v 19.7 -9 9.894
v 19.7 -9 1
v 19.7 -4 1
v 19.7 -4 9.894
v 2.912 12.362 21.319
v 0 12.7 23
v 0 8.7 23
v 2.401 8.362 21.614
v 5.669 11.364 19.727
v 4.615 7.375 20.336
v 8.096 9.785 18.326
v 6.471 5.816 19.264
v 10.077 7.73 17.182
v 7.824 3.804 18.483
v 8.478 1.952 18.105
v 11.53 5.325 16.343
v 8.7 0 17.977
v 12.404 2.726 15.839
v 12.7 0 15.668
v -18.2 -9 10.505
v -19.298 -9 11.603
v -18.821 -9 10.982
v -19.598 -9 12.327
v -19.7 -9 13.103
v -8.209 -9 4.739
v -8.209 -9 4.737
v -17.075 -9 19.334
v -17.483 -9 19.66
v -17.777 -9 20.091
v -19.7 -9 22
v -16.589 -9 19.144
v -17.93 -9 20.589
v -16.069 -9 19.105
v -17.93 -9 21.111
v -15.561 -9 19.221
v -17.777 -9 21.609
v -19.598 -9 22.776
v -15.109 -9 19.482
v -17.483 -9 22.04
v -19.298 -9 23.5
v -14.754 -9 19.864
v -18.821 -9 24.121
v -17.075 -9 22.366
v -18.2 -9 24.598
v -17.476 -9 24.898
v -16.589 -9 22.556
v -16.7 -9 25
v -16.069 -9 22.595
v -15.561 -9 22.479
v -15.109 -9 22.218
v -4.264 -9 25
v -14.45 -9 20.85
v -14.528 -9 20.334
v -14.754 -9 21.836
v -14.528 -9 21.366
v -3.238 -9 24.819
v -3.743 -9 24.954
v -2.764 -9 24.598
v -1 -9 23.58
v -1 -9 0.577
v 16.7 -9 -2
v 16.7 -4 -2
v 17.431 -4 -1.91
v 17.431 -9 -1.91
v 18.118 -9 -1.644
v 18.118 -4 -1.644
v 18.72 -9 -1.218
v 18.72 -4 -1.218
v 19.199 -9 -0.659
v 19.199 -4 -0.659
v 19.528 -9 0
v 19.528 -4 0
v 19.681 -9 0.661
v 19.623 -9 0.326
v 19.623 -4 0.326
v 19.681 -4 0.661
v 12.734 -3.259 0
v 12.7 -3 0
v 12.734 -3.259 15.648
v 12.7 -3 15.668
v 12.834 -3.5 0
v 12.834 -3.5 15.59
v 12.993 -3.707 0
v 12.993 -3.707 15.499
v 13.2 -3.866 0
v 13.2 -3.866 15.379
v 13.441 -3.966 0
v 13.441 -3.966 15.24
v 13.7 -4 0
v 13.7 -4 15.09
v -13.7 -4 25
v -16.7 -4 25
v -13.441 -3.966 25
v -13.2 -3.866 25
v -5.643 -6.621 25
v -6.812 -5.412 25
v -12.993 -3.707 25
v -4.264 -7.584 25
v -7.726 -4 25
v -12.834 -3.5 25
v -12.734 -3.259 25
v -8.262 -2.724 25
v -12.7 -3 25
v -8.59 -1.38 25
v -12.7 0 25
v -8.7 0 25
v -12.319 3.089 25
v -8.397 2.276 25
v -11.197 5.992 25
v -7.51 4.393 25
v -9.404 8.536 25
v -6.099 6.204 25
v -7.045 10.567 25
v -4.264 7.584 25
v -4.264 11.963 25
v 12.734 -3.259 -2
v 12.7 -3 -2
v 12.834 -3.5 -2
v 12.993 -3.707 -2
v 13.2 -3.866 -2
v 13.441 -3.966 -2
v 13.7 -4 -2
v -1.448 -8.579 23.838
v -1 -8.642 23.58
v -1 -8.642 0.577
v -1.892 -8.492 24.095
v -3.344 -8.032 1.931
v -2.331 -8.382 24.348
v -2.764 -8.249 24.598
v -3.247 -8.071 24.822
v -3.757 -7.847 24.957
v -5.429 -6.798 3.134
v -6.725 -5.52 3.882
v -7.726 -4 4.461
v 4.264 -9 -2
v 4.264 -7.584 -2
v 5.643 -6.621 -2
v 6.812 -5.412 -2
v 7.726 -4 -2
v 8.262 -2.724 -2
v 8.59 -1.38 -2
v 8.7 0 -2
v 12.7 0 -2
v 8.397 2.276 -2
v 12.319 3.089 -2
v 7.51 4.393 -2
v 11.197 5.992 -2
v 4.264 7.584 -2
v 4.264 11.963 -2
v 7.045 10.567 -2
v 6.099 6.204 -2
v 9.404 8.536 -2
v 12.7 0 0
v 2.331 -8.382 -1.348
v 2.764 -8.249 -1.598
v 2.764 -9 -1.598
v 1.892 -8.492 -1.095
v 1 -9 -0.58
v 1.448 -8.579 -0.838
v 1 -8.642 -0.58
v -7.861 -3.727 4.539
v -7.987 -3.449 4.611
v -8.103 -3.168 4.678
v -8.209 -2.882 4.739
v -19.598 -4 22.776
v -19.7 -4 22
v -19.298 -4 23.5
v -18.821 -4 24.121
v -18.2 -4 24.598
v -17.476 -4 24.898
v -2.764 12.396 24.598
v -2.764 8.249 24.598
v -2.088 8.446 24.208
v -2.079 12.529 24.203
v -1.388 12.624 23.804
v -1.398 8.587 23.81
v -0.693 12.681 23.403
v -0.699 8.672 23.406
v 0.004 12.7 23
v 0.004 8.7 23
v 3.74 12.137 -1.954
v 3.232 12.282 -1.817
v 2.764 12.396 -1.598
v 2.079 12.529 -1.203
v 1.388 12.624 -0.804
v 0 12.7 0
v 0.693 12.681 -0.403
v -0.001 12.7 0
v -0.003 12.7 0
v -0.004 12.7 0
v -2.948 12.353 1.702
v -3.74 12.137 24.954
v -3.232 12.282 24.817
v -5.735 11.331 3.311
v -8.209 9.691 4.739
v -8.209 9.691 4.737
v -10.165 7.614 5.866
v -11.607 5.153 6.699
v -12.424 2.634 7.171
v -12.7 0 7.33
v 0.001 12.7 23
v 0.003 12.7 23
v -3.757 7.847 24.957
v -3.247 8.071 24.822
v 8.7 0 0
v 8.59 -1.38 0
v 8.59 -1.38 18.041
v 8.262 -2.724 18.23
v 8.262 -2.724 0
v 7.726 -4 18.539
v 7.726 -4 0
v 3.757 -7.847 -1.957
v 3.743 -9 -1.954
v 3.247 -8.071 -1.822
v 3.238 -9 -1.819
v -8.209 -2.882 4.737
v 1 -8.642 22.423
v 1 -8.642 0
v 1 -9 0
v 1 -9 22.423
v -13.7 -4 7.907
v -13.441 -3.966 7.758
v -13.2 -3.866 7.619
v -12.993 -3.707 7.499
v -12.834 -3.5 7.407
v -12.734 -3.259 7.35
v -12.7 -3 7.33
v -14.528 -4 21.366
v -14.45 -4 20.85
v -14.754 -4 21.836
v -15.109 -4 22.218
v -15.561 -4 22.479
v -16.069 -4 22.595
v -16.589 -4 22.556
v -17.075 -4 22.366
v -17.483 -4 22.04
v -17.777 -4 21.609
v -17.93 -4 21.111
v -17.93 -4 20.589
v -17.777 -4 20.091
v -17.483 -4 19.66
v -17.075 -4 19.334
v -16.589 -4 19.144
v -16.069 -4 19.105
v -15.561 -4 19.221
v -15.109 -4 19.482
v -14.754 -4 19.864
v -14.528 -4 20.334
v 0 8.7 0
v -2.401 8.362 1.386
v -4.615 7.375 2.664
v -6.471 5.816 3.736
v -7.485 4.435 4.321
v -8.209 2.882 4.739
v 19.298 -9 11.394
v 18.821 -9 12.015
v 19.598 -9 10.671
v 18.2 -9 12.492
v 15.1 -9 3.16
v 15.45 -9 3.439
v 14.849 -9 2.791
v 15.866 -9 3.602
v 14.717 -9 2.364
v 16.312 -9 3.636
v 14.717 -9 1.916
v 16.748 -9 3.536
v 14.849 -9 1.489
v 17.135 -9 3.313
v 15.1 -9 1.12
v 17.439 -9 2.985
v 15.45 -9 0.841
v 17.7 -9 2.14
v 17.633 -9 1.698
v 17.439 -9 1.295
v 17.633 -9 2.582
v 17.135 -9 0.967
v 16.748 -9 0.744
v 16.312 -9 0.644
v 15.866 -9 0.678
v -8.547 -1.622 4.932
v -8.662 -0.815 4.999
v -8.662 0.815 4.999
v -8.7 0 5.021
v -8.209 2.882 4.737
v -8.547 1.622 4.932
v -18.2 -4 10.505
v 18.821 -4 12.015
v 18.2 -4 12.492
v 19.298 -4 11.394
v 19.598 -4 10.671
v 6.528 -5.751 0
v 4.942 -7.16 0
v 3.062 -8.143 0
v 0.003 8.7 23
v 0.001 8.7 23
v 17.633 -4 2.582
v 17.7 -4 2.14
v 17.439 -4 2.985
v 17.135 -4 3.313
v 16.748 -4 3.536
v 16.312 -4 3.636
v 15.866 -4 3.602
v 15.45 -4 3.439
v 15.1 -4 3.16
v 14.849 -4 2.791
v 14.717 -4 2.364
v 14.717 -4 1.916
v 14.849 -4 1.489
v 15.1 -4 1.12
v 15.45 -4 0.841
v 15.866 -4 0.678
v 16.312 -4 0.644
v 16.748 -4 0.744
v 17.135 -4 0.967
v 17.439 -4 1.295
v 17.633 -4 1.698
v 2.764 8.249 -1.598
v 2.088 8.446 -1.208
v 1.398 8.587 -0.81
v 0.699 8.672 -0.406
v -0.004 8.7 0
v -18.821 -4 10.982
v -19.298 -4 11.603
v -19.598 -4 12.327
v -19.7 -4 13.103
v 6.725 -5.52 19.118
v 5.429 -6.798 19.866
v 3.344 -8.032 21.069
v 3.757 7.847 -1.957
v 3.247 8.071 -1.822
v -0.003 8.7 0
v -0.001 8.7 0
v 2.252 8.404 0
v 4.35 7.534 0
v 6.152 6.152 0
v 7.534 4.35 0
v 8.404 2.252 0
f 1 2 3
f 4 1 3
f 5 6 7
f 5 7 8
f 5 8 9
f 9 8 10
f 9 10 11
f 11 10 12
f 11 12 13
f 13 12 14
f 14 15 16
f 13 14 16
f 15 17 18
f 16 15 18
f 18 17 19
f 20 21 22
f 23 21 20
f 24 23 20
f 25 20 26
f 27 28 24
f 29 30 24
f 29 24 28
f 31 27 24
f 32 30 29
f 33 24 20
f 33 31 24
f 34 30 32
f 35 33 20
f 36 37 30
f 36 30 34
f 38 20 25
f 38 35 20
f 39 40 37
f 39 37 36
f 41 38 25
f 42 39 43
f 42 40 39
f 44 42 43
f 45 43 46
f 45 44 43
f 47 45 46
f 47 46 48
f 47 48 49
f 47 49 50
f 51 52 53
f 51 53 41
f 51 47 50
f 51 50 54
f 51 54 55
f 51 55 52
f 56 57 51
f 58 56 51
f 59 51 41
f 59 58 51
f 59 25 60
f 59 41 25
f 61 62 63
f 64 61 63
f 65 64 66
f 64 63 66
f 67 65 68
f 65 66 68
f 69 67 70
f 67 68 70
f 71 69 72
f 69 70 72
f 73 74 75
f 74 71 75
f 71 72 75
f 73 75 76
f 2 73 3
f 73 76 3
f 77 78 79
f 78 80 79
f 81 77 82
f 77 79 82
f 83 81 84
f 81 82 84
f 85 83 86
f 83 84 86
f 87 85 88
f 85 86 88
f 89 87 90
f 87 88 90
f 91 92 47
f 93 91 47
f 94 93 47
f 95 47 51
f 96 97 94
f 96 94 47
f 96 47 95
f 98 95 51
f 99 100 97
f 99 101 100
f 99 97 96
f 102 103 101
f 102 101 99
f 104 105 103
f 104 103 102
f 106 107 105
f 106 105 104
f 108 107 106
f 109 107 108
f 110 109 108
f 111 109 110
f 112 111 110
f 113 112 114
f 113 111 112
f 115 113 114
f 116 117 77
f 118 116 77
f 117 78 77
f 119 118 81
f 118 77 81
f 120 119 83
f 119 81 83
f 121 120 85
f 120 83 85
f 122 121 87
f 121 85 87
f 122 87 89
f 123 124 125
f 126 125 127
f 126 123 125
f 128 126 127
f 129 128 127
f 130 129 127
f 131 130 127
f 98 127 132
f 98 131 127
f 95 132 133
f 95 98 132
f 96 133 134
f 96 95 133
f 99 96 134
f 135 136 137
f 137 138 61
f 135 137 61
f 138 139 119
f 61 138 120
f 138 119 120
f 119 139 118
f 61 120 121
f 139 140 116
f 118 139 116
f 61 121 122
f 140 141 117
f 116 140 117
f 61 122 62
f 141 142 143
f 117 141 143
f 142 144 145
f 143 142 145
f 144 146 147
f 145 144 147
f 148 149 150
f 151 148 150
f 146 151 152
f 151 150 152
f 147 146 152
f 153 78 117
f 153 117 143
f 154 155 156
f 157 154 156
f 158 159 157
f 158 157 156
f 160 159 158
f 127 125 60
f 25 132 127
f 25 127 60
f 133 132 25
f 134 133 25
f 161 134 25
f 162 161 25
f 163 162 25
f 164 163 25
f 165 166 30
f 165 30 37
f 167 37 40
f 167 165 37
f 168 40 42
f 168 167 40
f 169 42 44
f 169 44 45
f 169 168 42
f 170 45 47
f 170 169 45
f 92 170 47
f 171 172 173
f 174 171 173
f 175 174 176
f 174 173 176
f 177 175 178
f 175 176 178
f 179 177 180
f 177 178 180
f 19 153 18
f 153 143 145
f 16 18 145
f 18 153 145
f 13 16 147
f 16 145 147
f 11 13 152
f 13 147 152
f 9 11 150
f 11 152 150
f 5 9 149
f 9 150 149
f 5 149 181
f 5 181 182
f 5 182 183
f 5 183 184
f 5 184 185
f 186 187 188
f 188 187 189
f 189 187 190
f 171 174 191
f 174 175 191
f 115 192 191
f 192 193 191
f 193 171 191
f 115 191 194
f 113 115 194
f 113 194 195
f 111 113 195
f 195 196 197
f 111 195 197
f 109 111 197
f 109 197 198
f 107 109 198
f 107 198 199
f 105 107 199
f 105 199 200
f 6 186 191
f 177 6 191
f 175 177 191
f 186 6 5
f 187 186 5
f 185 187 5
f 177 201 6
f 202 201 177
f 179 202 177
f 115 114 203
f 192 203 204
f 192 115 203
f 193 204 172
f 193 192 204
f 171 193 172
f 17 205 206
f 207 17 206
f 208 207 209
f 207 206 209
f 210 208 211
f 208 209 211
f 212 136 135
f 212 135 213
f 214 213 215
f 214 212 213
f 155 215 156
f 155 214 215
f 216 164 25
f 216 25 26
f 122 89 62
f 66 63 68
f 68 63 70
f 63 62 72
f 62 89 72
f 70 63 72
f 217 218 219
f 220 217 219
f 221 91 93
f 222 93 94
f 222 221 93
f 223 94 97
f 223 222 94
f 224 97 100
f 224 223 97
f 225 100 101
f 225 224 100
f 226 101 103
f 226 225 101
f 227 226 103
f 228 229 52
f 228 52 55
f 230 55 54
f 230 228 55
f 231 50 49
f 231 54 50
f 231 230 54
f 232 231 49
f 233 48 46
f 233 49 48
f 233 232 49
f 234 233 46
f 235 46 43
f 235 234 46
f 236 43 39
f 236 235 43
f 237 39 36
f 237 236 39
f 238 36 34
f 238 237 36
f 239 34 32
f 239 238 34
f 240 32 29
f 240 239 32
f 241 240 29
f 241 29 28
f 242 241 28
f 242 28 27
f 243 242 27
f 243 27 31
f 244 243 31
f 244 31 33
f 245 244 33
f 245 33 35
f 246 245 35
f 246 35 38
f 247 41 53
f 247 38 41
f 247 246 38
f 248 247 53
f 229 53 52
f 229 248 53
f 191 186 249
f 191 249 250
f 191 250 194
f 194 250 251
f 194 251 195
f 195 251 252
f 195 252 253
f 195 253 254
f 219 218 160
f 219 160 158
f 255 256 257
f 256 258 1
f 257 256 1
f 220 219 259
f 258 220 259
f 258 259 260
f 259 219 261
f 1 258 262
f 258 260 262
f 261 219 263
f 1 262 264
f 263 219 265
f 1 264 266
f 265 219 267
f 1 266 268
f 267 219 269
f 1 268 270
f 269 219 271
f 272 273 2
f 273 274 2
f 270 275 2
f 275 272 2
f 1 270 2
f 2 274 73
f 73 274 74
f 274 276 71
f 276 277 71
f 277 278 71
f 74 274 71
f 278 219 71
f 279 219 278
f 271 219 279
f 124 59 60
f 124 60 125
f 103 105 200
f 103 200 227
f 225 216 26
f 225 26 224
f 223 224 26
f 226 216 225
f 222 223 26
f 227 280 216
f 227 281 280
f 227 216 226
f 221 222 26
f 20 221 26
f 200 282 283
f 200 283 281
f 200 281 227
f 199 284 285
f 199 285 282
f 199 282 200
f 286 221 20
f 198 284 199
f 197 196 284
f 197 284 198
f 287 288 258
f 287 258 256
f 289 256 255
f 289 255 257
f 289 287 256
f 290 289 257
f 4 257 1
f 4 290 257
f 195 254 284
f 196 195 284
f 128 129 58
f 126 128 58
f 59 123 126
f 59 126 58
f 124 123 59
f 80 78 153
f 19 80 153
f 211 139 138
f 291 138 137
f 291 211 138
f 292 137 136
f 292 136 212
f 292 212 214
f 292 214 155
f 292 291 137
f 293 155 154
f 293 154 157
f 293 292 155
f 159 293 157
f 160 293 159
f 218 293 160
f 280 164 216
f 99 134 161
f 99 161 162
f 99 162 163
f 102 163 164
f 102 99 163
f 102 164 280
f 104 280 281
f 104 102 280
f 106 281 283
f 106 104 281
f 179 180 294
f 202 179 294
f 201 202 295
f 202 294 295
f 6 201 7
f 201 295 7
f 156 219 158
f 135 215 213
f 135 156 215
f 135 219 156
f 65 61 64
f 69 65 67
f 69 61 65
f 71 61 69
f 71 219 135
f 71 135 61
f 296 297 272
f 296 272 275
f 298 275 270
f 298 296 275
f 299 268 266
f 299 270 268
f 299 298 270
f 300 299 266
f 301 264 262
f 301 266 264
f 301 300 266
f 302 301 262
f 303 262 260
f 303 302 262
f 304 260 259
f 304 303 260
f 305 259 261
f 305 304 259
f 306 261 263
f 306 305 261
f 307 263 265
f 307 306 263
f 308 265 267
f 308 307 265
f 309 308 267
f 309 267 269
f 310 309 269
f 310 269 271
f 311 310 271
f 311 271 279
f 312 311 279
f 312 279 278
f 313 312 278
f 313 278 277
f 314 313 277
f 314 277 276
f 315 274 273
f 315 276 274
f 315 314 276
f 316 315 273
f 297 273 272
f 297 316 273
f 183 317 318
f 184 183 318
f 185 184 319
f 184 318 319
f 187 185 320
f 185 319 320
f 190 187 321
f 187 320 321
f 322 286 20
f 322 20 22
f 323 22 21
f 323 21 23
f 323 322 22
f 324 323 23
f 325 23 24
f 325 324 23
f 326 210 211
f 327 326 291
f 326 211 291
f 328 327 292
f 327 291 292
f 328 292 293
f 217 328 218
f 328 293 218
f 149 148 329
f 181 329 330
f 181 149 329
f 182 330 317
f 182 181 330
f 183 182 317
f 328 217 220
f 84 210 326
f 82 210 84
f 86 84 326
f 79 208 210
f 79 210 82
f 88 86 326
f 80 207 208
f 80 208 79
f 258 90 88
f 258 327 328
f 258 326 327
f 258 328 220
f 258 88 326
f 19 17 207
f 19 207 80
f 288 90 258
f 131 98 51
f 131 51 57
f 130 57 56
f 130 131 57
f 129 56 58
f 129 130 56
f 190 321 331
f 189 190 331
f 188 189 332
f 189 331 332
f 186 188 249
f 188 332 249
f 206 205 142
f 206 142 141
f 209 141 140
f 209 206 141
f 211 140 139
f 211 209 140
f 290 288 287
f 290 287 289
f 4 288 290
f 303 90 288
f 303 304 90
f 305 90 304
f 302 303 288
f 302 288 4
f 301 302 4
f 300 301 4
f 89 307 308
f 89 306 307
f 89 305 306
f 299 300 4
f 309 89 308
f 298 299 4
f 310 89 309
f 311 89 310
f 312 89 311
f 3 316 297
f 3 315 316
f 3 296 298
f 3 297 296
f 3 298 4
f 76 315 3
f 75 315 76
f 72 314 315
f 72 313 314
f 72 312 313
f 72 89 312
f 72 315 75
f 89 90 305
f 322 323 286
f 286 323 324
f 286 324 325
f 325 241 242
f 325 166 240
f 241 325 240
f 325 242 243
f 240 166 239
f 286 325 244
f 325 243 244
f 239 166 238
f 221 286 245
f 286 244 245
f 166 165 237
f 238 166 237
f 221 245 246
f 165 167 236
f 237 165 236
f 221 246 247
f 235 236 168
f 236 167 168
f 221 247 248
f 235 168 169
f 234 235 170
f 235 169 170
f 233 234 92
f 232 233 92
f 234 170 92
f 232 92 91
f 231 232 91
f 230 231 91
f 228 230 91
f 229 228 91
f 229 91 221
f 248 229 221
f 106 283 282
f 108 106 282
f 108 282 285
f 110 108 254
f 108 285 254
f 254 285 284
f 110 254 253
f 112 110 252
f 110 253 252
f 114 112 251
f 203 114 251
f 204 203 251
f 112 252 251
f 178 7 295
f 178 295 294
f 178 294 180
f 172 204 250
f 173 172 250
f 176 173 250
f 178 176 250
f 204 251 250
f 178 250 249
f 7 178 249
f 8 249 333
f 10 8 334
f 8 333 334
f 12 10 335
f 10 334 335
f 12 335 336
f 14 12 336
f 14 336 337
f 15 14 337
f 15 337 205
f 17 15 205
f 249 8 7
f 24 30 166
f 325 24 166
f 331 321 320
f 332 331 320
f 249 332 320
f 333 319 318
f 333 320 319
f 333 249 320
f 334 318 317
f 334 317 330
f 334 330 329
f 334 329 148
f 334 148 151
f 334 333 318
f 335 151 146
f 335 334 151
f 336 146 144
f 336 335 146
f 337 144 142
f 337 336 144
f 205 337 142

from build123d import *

# Parameters (mm, degrees)
F0_W          = 7
F0_H          = 5
F1_DEPTH      = 25
F1_DEPTH_BACK = 2
F4_DEPTH      = 25
F4_DEPTH_BACK = 25
F5_DEPTH      = 25
F5_DEPTH_BACK = 25
F6_R          = 1
F7_R          = 1.75
F7_R_2        = 1.5
F8_DEPTH      = 25
F9_T1_DEPTH   = 20
F9_T3_DEPTH   = 13.6602540378
F9_T5_DEPTH   = 8.256448117
F9_T7_DEPTH   = 5.0368572892


# Not quite as in the source:
# - a fillet or chamfer that OpenCascade refuses, or shapes differently, is made with other operations: its cross-section is extruded or revolved along the edge and cut away or added


with BuildPart() as f1:
    # F0 (on Top) → F1 (new body, two sides)
    with BuildSketch(Plane.XY) as f1_sk:
        with Locations((-16.2, -6.5)):
            Rectangle(F0_W, F0_H)
        with Locations((16.2, -6.5)):
            Rectangle(F0_W, F0_H)
        with BuildLine():
            ThreePointArc((-12.0536301586, -4), (-12.5373662109, -2.0259438524), (-12.7, 0))
            Line((-12.7, 0), (-12.7, -4))
            Line((-12.7, -4), (-12.0536301586, -4))
        make_face()
        with BuildLine():
            Line((12.7, -4), (12.7, 0))
            ThreePointArc((12.7, 0), (12.5373662109, -2.0259438524), (12.0536301586, -4))
            Line((12.0536301586, -4), (12.7, -4))
        make_face()
        with BuildLine():
            ThreePointArc((-8.7, 0), (0, 8.7), (8.7, 0))
            Line((8.7, 0), (12.7, 0))
            ThreePointArc((12.7, 0), (0, 12.7), (-12.7, 0))
            Line((-12.7, 0), (-8.7, 0))
        make_face()
        with BuildLine():
            ThreePointArc((-8.9604687377, -9), (-10.8003744429, -6.6814603115), (-12.0536301586, -4))
            Line((-12.0536301586, -4), (-12.7, -4))
            Line((-12.7, -4), (-12.7, -9))
            Line((-12.7, -9), (-8.9604687377, -9))
        make_face()
        with BuildLine():
            Line((12.7, -4), (12.0536301586, -4))
            ThreePointArc((12.0536301586, -4), (10.8003744429, -6.6814603115), (8.9604687377, -9))
            Line((8.9604687377, -9), (12.7, -9))
            Line((12.7, -9), (12.7, -4))
        make_face()
        with BuildLine():
            ThreePointArc((-7.7259303647, -4), (-8.452975635, -2.0584467235), (-8.7, 0))
            Line((-8.7, 0), (-12.7, 0))
            ThreePointArc((-12.7, 0), (-12.5373662109, -2.0259438524), (-12.0536301586, -4))
            Line((-12.0536301586, -4), (-7.7259303647, -4))
        make_face()
        with BuildLine():
            Line((12.7, 0), (8.7, 0))
            ThreePointArc((8.7, 0), (8.452975635, -2.0584467235), (7.7259303647, -4))
            Line((7.7259303647, -4), (12.0536301586, -4))
            ThreePointArc((12.0536301586, -4), (12.5373662109, -2.0259438524), (12.7, 0))
        make_face()
        with BuildLine():
            ThreePointArc((-1, -8.6423376467), (-4.9419925019, -7.1600775213), (-7.7259303647, -4))
            Line((-7.7259303647, -4), (-12.0536301586, -4))
            ThreePointArc((-12.0536301586, -4), (-10.8003744429, -6.6814603115), (-8.9604687377, -9))
            Line((-8.9604687377, -9), (-1, -9))
            Line((-1, -9), (-1, -8.6423376467))
        make_face()
        with BuildLine():
            Line((12.0536301586, -4), (7.7259303647, -4))
            ThreePointArc((7.7259303647, -4), (4.9419925019, -7.1600775213), (1, -8.6423376467))
            Line((1, -8.6423376467), (1, -9))
            Line((1, -9), (8.9604687377, -9))
            ThreePointArc((8.9604687377, -9), (10.8003744429, -6.6814603115), (12.0536301586, -4))
        make_face()
    extrude(amount=F1_DEPTH)
    extrude(f1_sk.sketch, amount=-F1_DEPTH_BACK)

    # F3 (on Front) → F4 (cut, two sides)
    with BuildSketch(Plane.XZ) as f4_sk:
        Polygon((0.0041016151, 23), (0, 23), (39.8371685741, 0), (39.8371685741, 23), (28.9984290028, 23), (28.9984290028, 6.2601172778), align=None)
        Polygon((-3.46, 25), (0.0041016151, 23), (28.9984290028, 23), (28.9984290028, 25), align=None)
        Polygon((28.9984290028, 23), (0.0041016151, 23), (28.9984290028, 6.2601172778), align=None)
    extrude(amount=F4_DEPTH, mode=Mode.SUBTRACT)
    extrude(f4_sk.sketch, amount=-F4_DEPTH_BACK, mode=Mode.SUBTRACT)

    # F2 (on Front) → F5 (cut, two sides)
    with BuildSketch(Plane.XZ) as f5_sk:
        Polygon((-0.0041016151, 0), (0, 0), (-8.2087842873, 4.739343818), (-8.2087842873, 4.7369757494), align=None)
        Polygon((3.46, -2), (-0.0041016151, 0), (-8.2087842873, 0), (-8.2087842873, 4.7369757494), (-21.54, 12.4337567297), (-21.54, -2), align=None)
        Polygon((-8.2087842873, 0), (-0.0041016151, 0), (-8.2087842873, 4.7369757494), align=None)
    extrude(amount=F5_DEPTH, mode=Mode.SUBTRACT)
    extrude(f5_sk.sketch, amount=-F5_DEPTH_BACK, mode=Mode.SUBTRACT)

    # F6
    f6_edges = [f1.edges().sort_by_distance(p)[0] for p in [
        (12.7, -4, 6.833826),
        (-12.7, -4, 16.16499),
    ]]
    fillet(f6_edges, radius=F6_R)

    # F7 (on Front) → F8 (cut)
    with BuildSketch(Plane.XZ):
        with Locations((-16.2, 20.85)):
            Circle(F7_R)
        with Locations((16.2, 2.14)):
            Circle(F7_R_2)
    extrude(amount=F8_DEPTH, mode=Mode.SUBTRACT)

    # F9: fillet of radius 3 on 8 edges, made by hand

    # F9_s2 → F9_t1 (cut)
    with BuildSketch(Plane.XZ.offset(-3.5)):
        with BuildLine():
            ThreePointArc((16.7, -2), (18.8213203436, -1.1213203436), (19.7, 1))
            Line((19.7, 1), (19.7, -2))
            Line((19.7, -2), (16.7, -2))
        make_face()
        with BuildLine():
            ThreePointArc((-19.7, 22), (-18.8213203436, 24.1213203436), (-16.7, 25))
            Line((-16.7, 25), (-19.7, 25))
            Line((-19.7, 25), (-19.7, 22))
        make_face()
    extrude(amount=F9_T1_DEPTH, mode=Mode.SUBTRACT)

    # F9_s4 → F9_t3 (cut)
    with BuildSketch(Plane.XZ.offset(-0.3301270189)):
        with BuildLine():
            ThreePointArc((18.2, 12.4922251007), (19.2980762114, 11.3941488894), (19.7, 9.8941488894))
            Line((19.7, 9.8941488894), (19.7, 11.626199697))
            Line((19.7, 11.626199697), (18.2, 12.4922251007))
        make_face()
        with BuildLine():
            ThreePointArc((-18.2, 10.5054068306), (-19.2980762114, 11.603483042), (-19.7, 13.103483042))
            Line((-19.7, 13.103483042), (-19.7, 11.3714322344))
            Line((-19.7, 11.3714322344), (-18.2, 10.5054068306))
        make_face()
    extrude(amount=F9_T3_DEPTH, mode=Mode.SUBTRACT)

    # F9_s6 → F9_t5 (cut)
    with BuildSketch(Plane.XZ.offset(-14.2292097711)):
        with BuildLine():
            ThreePointArc((-4.2638475773, 25), (-3.487390442, 24.8977774789), (-2.7638475773, 24.5980762114))
            Line((-2.7638475773, 24.5980762114), (-3.46, 25))
            Line((-3.46, 25), (-4.2638475773, 25))
        make_face()
        with BuildLine():
            ThreePointArc((4.2638475773, -2), (3.487390442, -1.8977774789), (2.7638475773, -1.5980762114))
            Line((2.7638475773, -1.5980762114), (3.46, -2))
            Line((3.46, -2), (4.2638475773, -2))
        make_face()
    extrude(amount=F9_T5_DEPTH, mode=Mode.SUBTRACT)

    # F9_s8 → F9_t7 (cut)
    with BuildSketch(Plane.XZ.offset(5.9727616541)):
        with BuildLine():
            ThreePointArc((4.2638475773, -2), (3.487390442, -1.8977774789), (2.7638475773, -1.5980762114))
            Line((2.7638475773, -1.5980762114), (3.46, -2))
            Line((3.46, -2), (4.2638475773, -2))
        make_face()
        with BuildLine():
            ThreePointArc((-4.2638475773, 25), (-3.487390442, 24.8977774789), (-2.7638475773, 24.5980762114))
            Line((-2.7638475773, 24.5980762114), (-3.46, 25))
            Line((-3.46, 25), (-4.2638475773, 25))
        make_face()
    extrude(amount=F9_T7_DEPTH, mode=Mode.SUBTRACT)


solid = f1.part
